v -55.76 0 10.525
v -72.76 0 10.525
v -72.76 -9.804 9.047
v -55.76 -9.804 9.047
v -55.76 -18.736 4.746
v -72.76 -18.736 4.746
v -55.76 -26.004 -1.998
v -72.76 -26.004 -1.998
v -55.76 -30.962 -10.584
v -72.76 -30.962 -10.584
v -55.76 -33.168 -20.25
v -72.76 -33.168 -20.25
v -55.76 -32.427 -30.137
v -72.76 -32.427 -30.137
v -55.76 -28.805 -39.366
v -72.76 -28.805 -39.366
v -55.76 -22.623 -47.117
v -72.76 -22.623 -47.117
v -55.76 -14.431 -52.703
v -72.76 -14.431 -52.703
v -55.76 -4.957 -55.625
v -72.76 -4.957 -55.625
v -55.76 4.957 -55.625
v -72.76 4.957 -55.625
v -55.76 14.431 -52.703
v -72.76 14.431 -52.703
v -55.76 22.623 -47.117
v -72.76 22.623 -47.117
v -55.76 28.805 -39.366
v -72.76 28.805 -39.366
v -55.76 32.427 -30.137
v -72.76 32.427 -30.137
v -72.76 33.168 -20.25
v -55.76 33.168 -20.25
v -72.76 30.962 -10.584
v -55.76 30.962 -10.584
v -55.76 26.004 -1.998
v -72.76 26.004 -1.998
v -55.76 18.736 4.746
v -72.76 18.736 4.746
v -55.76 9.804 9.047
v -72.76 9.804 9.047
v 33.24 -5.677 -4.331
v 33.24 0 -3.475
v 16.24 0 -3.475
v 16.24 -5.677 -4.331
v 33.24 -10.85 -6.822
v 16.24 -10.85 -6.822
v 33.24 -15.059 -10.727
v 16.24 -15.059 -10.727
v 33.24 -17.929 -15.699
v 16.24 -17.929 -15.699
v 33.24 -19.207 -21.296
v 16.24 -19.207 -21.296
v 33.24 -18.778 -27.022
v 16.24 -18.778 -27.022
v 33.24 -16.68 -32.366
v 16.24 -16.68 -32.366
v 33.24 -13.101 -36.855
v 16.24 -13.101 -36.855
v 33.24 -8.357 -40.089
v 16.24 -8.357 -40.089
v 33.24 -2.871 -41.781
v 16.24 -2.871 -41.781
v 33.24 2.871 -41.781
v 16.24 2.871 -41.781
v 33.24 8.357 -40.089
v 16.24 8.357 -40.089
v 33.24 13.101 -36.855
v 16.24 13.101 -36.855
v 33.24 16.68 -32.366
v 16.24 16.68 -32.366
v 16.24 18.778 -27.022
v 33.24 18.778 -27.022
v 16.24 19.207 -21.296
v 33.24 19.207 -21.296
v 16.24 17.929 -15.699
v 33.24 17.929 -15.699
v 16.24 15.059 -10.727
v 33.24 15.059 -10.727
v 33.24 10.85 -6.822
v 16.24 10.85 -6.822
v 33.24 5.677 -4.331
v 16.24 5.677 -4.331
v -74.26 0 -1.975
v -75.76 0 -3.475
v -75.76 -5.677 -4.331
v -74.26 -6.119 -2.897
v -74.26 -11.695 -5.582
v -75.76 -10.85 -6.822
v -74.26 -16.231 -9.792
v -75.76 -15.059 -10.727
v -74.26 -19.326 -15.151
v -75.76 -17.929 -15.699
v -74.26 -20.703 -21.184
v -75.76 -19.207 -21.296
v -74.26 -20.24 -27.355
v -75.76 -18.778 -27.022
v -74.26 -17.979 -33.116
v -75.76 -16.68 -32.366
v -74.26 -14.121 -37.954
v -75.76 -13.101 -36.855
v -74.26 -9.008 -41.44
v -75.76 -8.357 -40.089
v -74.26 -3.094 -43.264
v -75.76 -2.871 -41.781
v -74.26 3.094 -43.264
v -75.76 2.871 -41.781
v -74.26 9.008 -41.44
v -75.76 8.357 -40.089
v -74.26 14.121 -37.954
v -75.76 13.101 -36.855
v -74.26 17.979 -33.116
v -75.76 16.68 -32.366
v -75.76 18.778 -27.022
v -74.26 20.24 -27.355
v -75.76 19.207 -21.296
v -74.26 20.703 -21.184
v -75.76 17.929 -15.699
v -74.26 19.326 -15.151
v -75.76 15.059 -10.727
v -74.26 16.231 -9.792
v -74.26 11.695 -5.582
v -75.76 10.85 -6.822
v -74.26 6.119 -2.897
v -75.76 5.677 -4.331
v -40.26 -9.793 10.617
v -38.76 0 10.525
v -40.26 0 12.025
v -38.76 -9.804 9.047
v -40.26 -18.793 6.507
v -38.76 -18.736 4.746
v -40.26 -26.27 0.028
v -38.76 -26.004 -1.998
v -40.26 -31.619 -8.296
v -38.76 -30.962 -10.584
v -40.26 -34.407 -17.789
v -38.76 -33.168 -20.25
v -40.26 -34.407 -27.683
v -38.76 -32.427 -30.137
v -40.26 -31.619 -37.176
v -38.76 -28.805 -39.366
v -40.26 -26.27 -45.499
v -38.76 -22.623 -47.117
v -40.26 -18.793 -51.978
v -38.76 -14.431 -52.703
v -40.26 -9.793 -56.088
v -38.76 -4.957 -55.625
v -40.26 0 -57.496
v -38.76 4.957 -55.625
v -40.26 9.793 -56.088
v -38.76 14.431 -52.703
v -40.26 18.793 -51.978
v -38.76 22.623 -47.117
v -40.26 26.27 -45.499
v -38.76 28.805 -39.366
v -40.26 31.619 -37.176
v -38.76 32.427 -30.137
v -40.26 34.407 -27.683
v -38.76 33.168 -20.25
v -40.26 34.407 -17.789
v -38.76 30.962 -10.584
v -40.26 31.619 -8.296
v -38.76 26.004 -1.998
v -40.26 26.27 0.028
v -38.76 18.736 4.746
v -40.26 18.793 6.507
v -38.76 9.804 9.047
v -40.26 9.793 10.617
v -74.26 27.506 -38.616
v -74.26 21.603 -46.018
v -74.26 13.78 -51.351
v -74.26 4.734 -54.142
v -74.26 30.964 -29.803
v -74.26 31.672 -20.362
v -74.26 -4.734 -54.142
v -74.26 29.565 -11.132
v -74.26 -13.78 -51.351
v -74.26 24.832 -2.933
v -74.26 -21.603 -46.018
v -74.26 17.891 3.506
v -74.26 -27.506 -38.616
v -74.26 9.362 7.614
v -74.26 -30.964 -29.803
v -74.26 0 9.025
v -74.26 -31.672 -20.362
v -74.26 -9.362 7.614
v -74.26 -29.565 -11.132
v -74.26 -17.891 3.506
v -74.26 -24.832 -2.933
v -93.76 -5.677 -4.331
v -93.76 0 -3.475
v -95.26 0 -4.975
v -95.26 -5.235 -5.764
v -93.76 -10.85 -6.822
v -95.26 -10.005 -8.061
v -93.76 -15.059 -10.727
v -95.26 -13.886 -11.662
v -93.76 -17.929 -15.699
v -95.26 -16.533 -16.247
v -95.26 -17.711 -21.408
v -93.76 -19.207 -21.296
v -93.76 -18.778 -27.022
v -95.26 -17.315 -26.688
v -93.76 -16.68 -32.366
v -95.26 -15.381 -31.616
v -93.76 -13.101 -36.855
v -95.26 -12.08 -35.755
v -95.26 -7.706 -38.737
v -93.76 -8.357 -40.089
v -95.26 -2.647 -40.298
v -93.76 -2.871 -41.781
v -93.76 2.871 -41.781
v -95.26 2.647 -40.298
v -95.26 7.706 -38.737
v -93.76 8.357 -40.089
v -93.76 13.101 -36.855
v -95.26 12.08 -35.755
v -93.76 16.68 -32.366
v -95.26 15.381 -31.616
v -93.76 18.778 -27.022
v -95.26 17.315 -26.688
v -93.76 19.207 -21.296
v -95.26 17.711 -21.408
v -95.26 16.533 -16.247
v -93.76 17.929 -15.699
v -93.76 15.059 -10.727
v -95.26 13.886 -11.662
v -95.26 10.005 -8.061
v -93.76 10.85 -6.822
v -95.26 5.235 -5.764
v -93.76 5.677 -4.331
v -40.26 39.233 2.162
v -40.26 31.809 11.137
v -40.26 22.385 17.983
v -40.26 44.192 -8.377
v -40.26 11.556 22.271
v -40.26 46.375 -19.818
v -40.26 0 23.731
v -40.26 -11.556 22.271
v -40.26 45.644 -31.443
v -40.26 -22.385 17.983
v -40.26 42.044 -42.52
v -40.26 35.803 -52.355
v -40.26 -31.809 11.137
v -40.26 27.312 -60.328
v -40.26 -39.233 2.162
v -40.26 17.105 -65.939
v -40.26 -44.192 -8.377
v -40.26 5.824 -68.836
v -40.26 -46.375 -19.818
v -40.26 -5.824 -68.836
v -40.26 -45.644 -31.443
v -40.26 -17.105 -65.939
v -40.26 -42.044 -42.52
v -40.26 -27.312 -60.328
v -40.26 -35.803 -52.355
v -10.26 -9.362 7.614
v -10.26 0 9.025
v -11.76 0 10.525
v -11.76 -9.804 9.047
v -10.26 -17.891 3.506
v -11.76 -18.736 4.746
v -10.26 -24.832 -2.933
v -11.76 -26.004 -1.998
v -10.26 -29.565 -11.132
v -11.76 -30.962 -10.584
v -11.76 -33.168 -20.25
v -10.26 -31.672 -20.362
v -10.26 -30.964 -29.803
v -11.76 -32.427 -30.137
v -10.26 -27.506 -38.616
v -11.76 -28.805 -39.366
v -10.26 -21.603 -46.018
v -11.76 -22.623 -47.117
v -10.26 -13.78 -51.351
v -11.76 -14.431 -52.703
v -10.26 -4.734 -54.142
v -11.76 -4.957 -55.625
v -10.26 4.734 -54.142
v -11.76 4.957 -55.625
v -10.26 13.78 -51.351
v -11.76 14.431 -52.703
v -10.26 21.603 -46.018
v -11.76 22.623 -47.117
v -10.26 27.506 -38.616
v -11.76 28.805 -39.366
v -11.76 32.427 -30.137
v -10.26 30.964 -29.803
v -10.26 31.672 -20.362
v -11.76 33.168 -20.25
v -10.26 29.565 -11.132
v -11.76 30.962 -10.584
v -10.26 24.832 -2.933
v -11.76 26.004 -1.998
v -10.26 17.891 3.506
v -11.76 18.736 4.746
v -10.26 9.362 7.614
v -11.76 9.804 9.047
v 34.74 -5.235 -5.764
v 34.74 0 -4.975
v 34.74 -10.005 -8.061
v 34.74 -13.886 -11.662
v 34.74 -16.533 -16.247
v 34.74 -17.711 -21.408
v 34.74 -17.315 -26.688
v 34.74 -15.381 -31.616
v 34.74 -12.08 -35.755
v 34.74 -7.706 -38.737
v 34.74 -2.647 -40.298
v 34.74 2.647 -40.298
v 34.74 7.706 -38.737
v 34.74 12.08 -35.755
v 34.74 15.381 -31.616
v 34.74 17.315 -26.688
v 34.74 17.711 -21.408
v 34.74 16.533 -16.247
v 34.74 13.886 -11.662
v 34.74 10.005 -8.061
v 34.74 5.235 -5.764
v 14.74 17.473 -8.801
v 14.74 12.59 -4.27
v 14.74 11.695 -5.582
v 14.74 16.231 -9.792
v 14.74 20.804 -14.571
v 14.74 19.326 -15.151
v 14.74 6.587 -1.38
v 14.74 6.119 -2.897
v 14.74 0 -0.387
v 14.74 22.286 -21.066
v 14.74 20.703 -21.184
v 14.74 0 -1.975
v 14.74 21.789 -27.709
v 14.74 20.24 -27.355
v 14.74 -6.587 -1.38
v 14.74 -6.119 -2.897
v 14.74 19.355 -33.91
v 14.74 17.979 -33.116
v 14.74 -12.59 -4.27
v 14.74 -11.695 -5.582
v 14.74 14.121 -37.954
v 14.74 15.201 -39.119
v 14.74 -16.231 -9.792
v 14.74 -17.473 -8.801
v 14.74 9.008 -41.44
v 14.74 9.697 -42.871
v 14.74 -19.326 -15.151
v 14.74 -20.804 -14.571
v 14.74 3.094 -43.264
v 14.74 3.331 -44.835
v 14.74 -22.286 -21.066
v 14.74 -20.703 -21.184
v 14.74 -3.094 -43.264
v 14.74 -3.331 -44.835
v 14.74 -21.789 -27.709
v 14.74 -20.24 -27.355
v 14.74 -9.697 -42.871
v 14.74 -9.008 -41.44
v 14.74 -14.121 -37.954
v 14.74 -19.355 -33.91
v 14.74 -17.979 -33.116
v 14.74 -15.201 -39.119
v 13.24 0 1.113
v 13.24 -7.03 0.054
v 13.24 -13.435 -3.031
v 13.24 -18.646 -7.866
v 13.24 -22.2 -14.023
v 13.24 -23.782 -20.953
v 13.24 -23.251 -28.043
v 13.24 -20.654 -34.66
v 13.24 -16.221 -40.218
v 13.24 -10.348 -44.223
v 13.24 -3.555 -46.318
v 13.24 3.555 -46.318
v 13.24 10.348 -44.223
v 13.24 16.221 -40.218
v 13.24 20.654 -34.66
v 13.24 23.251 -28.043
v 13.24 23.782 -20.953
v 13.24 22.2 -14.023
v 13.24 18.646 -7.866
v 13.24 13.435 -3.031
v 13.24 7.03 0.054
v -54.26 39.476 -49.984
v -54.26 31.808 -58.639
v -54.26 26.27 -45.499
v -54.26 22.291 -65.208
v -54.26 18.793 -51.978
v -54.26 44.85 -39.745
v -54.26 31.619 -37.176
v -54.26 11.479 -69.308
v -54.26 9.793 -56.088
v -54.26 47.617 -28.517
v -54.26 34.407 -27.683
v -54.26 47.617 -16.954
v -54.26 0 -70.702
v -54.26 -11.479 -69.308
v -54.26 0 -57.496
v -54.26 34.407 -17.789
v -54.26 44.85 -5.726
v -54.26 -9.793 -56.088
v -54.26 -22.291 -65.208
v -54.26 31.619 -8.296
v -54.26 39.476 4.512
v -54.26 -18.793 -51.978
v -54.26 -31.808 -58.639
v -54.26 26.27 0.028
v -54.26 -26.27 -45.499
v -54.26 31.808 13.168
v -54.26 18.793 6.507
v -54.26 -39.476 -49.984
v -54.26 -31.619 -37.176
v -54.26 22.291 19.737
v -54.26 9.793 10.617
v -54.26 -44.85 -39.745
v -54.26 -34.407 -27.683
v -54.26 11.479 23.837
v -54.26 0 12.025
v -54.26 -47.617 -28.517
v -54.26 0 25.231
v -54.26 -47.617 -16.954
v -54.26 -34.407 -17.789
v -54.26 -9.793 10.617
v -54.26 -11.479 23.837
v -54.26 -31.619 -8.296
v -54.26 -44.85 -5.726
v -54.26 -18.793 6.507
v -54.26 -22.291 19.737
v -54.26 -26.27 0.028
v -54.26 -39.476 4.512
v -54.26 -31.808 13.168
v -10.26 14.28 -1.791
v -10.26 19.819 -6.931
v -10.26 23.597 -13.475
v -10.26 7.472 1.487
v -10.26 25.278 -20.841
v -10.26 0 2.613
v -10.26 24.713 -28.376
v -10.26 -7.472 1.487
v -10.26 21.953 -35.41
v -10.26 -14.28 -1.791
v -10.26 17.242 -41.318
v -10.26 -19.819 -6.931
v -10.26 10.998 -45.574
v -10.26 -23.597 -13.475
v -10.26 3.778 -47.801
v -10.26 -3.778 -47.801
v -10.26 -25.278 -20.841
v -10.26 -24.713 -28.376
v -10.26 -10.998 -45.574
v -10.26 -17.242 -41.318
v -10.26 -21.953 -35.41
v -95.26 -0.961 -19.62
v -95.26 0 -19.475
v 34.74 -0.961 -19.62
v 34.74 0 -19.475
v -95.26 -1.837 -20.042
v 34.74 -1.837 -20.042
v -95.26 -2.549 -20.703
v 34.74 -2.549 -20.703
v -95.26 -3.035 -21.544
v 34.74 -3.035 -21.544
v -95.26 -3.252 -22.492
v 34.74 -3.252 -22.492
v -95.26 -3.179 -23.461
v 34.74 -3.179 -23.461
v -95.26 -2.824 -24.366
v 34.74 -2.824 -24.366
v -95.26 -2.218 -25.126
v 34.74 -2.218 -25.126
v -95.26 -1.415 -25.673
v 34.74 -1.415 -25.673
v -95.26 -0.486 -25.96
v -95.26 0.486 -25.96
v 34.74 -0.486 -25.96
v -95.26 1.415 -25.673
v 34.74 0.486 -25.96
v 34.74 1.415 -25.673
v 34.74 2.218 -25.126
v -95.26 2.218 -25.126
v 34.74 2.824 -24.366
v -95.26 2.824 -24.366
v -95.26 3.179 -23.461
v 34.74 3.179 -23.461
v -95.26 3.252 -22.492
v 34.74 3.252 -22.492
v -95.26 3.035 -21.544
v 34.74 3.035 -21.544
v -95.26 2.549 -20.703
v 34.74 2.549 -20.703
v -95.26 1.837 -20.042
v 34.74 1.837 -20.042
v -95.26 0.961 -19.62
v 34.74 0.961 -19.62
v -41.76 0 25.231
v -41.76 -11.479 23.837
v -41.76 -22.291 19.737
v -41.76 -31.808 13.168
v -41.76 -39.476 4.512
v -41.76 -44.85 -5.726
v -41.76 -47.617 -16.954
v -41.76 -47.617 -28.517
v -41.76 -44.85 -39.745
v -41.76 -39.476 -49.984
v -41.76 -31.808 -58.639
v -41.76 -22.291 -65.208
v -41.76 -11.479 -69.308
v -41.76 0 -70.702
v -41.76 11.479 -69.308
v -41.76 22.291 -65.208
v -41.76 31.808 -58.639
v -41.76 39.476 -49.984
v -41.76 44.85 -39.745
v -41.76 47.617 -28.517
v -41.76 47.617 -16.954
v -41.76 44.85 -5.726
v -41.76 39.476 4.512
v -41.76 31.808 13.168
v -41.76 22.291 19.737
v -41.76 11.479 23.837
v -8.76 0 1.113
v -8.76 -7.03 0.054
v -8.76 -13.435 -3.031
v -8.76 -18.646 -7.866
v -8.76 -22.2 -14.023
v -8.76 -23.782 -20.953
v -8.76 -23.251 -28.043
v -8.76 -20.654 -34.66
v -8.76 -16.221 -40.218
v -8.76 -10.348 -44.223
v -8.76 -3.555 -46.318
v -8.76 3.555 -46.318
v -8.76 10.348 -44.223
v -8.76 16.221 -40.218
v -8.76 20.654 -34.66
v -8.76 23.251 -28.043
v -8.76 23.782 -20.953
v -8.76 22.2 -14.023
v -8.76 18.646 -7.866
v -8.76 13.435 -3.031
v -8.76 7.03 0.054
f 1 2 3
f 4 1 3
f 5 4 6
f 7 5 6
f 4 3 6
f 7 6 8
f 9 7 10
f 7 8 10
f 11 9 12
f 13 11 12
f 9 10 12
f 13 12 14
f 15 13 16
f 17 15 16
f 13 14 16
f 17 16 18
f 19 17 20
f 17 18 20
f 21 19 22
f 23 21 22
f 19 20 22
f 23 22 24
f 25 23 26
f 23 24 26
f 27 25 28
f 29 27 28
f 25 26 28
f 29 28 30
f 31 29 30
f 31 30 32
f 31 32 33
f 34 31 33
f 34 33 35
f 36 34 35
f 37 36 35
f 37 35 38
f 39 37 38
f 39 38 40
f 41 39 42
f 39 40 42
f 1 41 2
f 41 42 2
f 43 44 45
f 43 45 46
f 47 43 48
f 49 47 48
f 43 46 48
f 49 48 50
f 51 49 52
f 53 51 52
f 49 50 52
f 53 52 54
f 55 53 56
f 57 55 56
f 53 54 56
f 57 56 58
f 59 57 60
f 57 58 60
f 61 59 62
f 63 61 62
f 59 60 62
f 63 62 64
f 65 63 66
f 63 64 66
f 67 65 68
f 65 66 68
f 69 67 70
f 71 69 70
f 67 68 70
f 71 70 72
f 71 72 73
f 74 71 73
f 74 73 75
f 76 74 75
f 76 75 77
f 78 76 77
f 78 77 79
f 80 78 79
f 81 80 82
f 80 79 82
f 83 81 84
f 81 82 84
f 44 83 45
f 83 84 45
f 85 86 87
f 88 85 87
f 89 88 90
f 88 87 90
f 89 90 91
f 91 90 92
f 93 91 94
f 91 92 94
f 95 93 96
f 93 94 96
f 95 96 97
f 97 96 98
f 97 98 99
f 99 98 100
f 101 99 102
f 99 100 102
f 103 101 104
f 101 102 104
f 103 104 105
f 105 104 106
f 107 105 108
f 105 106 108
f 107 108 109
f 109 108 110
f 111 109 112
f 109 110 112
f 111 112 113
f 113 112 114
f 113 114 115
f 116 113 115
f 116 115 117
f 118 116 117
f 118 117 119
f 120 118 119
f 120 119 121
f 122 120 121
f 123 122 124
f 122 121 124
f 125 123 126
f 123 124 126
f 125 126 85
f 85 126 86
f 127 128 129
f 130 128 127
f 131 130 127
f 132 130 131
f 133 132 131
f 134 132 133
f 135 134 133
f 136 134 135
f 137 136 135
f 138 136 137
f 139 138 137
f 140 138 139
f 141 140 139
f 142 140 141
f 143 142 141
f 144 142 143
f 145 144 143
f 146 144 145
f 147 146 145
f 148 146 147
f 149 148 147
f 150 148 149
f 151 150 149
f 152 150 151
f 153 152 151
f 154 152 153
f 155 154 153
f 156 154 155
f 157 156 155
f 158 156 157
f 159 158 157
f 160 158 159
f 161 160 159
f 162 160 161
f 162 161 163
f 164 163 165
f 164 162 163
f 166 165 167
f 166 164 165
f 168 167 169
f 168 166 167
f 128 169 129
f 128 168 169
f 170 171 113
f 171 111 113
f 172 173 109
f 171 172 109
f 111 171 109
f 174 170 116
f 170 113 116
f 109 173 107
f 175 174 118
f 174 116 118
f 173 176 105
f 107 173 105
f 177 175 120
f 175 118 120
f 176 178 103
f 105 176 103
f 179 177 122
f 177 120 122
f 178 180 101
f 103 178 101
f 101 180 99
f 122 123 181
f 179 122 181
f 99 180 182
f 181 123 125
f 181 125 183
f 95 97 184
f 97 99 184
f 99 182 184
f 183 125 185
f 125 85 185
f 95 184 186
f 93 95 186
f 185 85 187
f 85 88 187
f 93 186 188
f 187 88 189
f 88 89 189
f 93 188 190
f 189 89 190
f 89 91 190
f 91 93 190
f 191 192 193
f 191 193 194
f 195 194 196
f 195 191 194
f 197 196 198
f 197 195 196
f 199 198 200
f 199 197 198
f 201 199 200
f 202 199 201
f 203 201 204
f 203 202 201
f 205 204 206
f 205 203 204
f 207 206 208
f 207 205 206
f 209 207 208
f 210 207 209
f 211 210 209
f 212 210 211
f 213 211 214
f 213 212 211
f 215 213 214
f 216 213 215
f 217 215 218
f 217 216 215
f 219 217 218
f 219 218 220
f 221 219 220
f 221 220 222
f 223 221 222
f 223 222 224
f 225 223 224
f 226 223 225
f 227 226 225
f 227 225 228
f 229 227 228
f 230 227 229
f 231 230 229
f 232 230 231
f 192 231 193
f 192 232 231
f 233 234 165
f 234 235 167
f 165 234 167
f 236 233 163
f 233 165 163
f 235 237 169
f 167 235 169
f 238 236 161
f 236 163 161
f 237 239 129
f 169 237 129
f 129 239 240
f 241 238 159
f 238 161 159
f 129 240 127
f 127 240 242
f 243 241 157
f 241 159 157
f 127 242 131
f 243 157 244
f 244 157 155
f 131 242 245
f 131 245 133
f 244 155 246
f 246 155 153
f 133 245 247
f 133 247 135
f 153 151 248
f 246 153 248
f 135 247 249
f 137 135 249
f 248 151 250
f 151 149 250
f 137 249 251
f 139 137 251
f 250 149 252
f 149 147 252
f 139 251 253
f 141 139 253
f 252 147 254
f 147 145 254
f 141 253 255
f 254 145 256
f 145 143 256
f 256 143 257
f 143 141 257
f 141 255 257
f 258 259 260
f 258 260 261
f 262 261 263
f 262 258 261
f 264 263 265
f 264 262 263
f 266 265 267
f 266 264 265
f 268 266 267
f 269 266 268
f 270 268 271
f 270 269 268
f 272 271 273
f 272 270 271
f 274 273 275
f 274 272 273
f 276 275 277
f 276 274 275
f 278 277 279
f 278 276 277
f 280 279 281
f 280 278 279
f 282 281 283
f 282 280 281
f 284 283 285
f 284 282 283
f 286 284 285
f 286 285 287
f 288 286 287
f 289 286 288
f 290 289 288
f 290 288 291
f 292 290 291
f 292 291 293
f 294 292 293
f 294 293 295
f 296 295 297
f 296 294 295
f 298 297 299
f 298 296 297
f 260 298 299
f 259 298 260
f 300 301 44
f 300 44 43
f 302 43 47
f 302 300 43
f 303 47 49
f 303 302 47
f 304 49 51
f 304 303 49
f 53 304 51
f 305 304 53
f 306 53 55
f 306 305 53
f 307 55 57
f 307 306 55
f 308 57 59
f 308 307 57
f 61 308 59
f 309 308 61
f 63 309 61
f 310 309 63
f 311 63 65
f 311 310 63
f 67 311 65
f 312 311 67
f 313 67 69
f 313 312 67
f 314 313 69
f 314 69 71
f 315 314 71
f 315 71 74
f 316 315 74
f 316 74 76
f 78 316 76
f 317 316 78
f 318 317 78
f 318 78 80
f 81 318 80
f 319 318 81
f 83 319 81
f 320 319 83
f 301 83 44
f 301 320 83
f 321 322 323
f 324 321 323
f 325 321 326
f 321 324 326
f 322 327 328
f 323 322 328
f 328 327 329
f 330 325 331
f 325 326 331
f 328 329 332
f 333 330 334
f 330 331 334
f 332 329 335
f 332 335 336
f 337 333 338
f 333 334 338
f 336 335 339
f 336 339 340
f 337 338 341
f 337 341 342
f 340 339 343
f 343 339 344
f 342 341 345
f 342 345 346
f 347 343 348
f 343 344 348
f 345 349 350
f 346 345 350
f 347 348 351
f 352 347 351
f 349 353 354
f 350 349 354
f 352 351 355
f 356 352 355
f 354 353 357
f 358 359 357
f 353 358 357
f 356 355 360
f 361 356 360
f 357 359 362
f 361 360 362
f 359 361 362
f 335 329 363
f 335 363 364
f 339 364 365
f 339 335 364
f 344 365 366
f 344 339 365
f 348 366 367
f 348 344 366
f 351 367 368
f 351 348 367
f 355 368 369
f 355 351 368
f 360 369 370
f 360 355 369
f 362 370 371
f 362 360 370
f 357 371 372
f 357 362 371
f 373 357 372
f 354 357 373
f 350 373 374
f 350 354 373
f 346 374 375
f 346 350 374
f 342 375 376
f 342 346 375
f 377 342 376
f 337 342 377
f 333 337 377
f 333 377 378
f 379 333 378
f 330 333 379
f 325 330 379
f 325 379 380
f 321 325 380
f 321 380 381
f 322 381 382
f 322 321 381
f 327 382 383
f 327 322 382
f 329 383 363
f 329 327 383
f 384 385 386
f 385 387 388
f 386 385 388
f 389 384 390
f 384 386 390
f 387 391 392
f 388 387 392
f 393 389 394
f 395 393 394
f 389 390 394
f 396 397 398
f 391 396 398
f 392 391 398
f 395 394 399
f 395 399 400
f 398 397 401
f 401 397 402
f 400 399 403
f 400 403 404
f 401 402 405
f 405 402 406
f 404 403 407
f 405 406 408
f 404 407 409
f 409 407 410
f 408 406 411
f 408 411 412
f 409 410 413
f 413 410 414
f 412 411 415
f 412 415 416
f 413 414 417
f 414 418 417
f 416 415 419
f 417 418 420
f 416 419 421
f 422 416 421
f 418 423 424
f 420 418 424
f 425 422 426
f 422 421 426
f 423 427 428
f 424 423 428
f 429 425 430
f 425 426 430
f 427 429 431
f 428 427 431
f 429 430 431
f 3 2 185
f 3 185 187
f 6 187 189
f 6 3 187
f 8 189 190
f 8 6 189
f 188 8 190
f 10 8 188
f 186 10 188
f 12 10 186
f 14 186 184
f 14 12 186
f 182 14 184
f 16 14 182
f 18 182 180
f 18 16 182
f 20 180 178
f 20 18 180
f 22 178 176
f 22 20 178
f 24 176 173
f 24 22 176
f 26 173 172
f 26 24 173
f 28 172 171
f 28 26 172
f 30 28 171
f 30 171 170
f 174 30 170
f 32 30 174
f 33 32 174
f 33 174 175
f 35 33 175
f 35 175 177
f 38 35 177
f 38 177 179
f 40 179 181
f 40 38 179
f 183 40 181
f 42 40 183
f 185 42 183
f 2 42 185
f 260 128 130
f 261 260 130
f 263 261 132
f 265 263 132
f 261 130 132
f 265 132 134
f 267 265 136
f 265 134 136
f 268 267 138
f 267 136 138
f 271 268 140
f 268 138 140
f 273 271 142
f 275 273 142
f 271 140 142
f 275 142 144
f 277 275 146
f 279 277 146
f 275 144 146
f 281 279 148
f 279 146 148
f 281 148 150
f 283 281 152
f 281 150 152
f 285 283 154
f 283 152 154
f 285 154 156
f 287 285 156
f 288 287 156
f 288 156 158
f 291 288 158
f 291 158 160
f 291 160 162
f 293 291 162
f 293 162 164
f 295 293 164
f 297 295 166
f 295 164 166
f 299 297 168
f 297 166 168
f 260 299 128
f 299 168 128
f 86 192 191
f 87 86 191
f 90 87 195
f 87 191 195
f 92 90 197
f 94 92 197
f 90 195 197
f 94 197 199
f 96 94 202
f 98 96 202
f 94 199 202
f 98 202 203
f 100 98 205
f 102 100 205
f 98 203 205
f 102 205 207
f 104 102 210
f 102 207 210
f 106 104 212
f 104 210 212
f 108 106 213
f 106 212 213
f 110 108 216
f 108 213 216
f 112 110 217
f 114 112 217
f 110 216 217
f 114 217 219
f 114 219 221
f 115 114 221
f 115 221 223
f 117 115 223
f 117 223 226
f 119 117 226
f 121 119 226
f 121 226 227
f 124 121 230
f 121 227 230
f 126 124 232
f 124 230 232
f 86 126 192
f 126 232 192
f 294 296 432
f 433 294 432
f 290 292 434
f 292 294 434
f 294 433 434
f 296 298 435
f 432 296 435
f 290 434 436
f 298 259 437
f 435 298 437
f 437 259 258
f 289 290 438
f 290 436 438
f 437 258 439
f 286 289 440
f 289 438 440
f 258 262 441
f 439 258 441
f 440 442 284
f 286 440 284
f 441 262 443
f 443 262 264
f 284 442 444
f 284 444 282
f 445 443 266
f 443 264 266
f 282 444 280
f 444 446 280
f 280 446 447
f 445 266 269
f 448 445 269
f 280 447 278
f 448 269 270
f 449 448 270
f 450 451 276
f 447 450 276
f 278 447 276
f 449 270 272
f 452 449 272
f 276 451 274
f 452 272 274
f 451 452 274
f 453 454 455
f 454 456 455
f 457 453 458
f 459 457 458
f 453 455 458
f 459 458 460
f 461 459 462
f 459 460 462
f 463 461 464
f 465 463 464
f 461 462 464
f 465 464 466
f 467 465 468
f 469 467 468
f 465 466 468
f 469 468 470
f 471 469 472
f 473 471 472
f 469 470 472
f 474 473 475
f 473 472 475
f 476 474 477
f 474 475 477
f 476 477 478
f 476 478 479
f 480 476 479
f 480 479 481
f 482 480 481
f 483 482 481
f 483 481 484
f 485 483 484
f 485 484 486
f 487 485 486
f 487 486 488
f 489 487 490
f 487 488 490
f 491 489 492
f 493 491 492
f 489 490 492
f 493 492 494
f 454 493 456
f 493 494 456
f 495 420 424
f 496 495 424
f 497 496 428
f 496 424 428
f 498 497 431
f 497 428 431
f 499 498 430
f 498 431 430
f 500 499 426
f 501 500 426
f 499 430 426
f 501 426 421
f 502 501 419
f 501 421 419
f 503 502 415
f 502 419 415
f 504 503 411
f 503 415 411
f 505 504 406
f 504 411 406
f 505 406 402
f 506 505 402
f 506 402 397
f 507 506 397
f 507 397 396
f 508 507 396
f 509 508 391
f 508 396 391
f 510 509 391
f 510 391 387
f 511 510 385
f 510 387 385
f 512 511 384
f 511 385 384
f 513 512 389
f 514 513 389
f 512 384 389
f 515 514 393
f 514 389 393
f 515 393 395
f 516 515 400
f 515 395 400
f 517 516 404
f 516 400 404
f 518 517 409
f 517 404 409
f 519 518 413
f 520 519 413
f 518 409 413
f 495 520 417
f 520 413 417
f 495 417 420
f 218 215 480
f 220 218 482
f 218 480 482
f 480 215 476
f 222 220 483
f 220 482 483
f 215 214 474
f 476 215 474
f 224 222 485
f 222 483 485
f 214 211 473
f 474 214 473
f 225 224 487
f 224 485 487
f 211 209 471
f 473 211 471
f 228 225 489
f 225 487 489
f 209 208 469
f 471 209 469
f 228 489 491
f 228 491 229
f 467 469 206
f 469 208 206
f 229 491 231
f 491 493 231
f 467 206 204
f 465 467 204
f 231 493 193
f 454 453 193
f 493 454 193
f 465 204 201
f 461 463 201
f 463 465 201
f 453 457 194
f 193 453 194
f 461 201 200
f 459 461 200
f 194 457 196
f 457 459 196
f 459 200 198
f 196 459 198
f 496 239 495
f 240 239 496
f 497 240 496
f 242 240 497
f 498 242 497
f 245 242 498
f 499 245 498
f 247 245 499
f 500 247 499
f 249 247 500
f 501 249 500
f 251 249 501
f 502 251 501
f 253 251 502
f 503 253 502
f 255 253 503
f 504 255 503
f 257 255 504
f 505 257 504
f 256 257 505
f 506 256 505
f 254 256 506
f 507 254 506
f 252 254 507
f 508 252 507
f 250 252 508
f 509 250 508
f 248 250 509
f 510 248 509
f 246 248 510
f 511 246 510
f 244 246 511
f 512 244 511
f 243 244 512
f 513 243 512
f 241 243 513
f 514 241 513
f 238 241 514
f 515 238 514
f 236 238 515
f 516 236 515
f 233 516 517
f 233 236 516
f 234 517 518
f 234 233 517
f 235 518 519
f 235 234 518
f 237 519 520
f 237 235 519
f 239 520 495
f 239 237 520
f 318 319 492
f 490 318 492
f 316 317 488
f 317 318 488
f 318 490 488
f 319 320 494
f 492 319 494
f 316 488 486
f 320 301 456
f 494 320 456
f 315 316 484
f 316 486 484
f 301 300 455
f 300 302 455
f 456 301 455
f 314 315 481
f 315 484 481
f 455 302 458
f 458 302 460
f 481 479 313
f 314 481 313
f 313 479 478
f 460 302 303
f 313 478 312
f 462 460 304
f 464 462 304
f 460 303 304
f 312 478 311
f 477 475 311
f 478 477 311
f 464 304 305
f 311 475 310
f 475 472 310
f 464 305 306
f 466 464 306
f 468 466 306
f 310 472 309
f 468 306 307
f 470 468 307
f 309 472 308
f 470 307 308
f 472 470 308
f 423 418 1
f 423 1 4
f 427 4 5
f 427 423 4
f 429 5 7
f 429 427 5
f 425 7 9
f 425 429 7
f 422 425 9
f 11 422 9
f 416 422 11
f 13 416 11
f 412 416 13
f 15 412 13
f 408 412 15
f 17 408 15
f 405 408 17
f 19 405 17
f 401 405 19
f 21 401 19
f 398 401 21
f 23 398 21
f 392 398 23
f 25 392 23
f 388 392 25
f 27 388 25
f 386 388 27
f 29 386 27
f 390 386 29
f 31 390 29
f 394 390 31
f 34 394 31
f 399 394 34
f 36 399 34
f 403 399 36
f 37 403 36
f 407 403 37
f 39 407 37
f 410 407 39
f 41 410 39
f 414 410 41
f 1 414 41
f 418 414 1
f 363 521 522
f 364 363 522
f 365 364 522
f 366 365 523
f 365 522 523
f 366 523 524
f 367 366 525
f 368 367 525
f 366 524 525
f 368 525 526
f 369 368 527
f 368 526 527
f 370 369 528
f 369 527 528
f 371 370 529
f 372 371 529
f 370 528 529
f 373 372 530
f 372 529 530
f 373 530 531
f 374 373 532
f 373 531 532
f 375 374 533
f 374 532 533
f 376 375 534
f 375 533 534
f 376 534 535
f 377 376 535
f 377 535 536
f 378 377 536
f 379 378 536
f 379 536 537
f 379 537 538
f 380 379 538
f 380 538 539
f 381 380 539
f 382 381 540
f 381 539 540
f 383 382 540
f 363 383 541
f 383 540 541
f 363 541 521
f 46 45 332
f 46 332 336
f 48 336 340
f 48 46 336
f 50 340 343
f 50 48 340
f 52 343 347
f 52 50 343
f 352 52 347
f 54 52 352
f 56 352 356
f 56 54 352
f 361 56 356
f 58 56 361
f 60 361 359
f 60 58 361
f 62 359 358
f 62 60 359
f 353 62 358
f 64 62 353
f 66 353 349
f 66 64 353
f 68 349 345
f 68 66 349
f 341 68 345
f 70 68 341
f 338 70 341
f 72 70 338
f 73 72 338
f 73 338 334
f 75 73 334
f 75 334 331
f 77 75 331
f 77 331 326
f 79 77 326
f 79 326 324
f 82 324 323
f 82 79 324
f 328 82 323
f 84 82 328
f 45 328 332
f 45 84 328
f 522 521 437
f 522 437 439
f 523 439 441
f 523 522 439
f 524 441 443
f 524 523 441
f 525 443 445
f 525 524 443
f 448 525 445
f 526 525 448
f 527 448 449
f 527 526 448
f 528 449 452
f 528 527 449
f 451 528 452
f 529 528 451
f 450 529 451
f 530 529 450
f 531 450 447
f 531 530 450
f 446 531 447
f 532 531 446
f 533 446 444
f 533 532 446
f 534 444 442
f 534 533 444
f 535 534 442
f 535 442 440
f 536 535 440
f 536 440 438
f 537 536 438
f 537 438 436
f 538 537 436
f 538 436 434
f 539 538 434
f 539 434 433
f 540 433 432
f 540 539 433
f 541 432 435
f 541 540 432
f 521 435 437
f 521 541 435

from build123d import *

# Parameters (mm, degrees)
F2_SIZE  = 1.5
F3_SIZE  = 1.5
F4_SIZE  = 1.5
F5_SIZE  = 1.5
F6_SIZE  = 1.5
F7_SIZE  = 1.5
F8_SIZE  = 1.5
F9_SIZE  = 1.5
F10_SIZE = 1.5
F11_SIZE = 1.5
F12_SIZE = 1.5


with BuildPart() as f1:
    # F0 (on Front) → F1 (revolve)
    with BuildSketch(Plane.XZ):
        Polygon((-95.2596903405, -3.4749341272), (-95.2596903405, -19.4749341272), (34.7403096595, -19.4749341272), (34.7403096595, -3.4749341272), (14.7403096595, -3.4749341272), (14.7403096595, 1.1133044657), (-10.2596903405, 1.1133044657), (-10.2596903405, 10.5250658728), (-40.2596903405, 10.5250658728), (-40.2596903405, 25.2309465764), (-54.2596903405, 25.2309465764), (-54.2596903405, 10.5250658728), (-74.2596903405, 10.5250658728), (-74.2596903405, -3.4749341272), align=None)
    revolve(axis=Axis((-30.2943464648, 0, -22.7356459945), (1, 0, 0)))

    # F2
    f2_edges = [f1.edges().sort_by_distance(p)[0] for p in [
        (-95.25969, 0, -41.996358),
    ]]
    chamfer(f2_edges, length=F2_SIZE)

    # F3
    f3_edges = [f1.edges().sort_by_distance(p)[0] for p in [
        (-74.25969, 0, -55.996358),
    ]]
    chamfer(f3_edges, length=F3_SIZE)

    # F4
    f4_edges = [f1.edges().sort_by_distance(p)[0] for p in [
        (-40.25969, 0, -70.702239),
    ]]
    chamfer(f4_edges, length=F4_SIZE)

    # F5
    f5_edges = [f1.edges().sort_by_distance(p)[0] for p in [
        (-10.25969, 0, -55.996358),
    ]]
    chamfer(f5_edges, length=F5_SIZE)

    # F6
    f6_edges = [f1.edges().sort_by_distance(p)[0] for p in [
        (14.74031, 0, -46.584596),
    ]]
    chamfer(f6_edges, length=F6_SIZE)

    # F7
    f7_edges = [f1.edges().sort_by_distance(p)[0] for p in [
        (34.74031, 0, -41.996358),
    ]]
    chamfer(f7_edges, length=F7_SIZE)

    # F8
    f8_edges = [f1.edges().sort_by_distance(p)[0] for p in [
        (-54.25969, 0, -55.996358),
    ]]
    chamfer(f8_edges, length=F8_SIZE)

    # F9
    f9_edges = [f1.edges().sort_by_distance(p)[0] for p in [
        (-74.25969, 0, -41.996358),
    ]]
    chamfer(f9_edges, length=F9_SIZE)

    # F10
    f10_edges = [f1.edges().sort_by_distance(p)[0] for p in [
        (-40.25969, 0, -55.996358),
    ]]
    chamfer(f10_edges, length=F10_SIZE)

    # F11
    f11_edges = [f1.edges().sort_by_distance(p)[0] for p in [
        (-10.25969, 0, -46.584596),
    ]]
    chamfer(f11_edges, length=F11_SIZE)

    # F12
    f12_edges = [f1.edges().sort_by_distance(p)[0] for p in [
        (14.74031, 0, -41.996358),
    ]]
    chamfer(f12_edges, length=F12_SIZE)


solid = f1.part
